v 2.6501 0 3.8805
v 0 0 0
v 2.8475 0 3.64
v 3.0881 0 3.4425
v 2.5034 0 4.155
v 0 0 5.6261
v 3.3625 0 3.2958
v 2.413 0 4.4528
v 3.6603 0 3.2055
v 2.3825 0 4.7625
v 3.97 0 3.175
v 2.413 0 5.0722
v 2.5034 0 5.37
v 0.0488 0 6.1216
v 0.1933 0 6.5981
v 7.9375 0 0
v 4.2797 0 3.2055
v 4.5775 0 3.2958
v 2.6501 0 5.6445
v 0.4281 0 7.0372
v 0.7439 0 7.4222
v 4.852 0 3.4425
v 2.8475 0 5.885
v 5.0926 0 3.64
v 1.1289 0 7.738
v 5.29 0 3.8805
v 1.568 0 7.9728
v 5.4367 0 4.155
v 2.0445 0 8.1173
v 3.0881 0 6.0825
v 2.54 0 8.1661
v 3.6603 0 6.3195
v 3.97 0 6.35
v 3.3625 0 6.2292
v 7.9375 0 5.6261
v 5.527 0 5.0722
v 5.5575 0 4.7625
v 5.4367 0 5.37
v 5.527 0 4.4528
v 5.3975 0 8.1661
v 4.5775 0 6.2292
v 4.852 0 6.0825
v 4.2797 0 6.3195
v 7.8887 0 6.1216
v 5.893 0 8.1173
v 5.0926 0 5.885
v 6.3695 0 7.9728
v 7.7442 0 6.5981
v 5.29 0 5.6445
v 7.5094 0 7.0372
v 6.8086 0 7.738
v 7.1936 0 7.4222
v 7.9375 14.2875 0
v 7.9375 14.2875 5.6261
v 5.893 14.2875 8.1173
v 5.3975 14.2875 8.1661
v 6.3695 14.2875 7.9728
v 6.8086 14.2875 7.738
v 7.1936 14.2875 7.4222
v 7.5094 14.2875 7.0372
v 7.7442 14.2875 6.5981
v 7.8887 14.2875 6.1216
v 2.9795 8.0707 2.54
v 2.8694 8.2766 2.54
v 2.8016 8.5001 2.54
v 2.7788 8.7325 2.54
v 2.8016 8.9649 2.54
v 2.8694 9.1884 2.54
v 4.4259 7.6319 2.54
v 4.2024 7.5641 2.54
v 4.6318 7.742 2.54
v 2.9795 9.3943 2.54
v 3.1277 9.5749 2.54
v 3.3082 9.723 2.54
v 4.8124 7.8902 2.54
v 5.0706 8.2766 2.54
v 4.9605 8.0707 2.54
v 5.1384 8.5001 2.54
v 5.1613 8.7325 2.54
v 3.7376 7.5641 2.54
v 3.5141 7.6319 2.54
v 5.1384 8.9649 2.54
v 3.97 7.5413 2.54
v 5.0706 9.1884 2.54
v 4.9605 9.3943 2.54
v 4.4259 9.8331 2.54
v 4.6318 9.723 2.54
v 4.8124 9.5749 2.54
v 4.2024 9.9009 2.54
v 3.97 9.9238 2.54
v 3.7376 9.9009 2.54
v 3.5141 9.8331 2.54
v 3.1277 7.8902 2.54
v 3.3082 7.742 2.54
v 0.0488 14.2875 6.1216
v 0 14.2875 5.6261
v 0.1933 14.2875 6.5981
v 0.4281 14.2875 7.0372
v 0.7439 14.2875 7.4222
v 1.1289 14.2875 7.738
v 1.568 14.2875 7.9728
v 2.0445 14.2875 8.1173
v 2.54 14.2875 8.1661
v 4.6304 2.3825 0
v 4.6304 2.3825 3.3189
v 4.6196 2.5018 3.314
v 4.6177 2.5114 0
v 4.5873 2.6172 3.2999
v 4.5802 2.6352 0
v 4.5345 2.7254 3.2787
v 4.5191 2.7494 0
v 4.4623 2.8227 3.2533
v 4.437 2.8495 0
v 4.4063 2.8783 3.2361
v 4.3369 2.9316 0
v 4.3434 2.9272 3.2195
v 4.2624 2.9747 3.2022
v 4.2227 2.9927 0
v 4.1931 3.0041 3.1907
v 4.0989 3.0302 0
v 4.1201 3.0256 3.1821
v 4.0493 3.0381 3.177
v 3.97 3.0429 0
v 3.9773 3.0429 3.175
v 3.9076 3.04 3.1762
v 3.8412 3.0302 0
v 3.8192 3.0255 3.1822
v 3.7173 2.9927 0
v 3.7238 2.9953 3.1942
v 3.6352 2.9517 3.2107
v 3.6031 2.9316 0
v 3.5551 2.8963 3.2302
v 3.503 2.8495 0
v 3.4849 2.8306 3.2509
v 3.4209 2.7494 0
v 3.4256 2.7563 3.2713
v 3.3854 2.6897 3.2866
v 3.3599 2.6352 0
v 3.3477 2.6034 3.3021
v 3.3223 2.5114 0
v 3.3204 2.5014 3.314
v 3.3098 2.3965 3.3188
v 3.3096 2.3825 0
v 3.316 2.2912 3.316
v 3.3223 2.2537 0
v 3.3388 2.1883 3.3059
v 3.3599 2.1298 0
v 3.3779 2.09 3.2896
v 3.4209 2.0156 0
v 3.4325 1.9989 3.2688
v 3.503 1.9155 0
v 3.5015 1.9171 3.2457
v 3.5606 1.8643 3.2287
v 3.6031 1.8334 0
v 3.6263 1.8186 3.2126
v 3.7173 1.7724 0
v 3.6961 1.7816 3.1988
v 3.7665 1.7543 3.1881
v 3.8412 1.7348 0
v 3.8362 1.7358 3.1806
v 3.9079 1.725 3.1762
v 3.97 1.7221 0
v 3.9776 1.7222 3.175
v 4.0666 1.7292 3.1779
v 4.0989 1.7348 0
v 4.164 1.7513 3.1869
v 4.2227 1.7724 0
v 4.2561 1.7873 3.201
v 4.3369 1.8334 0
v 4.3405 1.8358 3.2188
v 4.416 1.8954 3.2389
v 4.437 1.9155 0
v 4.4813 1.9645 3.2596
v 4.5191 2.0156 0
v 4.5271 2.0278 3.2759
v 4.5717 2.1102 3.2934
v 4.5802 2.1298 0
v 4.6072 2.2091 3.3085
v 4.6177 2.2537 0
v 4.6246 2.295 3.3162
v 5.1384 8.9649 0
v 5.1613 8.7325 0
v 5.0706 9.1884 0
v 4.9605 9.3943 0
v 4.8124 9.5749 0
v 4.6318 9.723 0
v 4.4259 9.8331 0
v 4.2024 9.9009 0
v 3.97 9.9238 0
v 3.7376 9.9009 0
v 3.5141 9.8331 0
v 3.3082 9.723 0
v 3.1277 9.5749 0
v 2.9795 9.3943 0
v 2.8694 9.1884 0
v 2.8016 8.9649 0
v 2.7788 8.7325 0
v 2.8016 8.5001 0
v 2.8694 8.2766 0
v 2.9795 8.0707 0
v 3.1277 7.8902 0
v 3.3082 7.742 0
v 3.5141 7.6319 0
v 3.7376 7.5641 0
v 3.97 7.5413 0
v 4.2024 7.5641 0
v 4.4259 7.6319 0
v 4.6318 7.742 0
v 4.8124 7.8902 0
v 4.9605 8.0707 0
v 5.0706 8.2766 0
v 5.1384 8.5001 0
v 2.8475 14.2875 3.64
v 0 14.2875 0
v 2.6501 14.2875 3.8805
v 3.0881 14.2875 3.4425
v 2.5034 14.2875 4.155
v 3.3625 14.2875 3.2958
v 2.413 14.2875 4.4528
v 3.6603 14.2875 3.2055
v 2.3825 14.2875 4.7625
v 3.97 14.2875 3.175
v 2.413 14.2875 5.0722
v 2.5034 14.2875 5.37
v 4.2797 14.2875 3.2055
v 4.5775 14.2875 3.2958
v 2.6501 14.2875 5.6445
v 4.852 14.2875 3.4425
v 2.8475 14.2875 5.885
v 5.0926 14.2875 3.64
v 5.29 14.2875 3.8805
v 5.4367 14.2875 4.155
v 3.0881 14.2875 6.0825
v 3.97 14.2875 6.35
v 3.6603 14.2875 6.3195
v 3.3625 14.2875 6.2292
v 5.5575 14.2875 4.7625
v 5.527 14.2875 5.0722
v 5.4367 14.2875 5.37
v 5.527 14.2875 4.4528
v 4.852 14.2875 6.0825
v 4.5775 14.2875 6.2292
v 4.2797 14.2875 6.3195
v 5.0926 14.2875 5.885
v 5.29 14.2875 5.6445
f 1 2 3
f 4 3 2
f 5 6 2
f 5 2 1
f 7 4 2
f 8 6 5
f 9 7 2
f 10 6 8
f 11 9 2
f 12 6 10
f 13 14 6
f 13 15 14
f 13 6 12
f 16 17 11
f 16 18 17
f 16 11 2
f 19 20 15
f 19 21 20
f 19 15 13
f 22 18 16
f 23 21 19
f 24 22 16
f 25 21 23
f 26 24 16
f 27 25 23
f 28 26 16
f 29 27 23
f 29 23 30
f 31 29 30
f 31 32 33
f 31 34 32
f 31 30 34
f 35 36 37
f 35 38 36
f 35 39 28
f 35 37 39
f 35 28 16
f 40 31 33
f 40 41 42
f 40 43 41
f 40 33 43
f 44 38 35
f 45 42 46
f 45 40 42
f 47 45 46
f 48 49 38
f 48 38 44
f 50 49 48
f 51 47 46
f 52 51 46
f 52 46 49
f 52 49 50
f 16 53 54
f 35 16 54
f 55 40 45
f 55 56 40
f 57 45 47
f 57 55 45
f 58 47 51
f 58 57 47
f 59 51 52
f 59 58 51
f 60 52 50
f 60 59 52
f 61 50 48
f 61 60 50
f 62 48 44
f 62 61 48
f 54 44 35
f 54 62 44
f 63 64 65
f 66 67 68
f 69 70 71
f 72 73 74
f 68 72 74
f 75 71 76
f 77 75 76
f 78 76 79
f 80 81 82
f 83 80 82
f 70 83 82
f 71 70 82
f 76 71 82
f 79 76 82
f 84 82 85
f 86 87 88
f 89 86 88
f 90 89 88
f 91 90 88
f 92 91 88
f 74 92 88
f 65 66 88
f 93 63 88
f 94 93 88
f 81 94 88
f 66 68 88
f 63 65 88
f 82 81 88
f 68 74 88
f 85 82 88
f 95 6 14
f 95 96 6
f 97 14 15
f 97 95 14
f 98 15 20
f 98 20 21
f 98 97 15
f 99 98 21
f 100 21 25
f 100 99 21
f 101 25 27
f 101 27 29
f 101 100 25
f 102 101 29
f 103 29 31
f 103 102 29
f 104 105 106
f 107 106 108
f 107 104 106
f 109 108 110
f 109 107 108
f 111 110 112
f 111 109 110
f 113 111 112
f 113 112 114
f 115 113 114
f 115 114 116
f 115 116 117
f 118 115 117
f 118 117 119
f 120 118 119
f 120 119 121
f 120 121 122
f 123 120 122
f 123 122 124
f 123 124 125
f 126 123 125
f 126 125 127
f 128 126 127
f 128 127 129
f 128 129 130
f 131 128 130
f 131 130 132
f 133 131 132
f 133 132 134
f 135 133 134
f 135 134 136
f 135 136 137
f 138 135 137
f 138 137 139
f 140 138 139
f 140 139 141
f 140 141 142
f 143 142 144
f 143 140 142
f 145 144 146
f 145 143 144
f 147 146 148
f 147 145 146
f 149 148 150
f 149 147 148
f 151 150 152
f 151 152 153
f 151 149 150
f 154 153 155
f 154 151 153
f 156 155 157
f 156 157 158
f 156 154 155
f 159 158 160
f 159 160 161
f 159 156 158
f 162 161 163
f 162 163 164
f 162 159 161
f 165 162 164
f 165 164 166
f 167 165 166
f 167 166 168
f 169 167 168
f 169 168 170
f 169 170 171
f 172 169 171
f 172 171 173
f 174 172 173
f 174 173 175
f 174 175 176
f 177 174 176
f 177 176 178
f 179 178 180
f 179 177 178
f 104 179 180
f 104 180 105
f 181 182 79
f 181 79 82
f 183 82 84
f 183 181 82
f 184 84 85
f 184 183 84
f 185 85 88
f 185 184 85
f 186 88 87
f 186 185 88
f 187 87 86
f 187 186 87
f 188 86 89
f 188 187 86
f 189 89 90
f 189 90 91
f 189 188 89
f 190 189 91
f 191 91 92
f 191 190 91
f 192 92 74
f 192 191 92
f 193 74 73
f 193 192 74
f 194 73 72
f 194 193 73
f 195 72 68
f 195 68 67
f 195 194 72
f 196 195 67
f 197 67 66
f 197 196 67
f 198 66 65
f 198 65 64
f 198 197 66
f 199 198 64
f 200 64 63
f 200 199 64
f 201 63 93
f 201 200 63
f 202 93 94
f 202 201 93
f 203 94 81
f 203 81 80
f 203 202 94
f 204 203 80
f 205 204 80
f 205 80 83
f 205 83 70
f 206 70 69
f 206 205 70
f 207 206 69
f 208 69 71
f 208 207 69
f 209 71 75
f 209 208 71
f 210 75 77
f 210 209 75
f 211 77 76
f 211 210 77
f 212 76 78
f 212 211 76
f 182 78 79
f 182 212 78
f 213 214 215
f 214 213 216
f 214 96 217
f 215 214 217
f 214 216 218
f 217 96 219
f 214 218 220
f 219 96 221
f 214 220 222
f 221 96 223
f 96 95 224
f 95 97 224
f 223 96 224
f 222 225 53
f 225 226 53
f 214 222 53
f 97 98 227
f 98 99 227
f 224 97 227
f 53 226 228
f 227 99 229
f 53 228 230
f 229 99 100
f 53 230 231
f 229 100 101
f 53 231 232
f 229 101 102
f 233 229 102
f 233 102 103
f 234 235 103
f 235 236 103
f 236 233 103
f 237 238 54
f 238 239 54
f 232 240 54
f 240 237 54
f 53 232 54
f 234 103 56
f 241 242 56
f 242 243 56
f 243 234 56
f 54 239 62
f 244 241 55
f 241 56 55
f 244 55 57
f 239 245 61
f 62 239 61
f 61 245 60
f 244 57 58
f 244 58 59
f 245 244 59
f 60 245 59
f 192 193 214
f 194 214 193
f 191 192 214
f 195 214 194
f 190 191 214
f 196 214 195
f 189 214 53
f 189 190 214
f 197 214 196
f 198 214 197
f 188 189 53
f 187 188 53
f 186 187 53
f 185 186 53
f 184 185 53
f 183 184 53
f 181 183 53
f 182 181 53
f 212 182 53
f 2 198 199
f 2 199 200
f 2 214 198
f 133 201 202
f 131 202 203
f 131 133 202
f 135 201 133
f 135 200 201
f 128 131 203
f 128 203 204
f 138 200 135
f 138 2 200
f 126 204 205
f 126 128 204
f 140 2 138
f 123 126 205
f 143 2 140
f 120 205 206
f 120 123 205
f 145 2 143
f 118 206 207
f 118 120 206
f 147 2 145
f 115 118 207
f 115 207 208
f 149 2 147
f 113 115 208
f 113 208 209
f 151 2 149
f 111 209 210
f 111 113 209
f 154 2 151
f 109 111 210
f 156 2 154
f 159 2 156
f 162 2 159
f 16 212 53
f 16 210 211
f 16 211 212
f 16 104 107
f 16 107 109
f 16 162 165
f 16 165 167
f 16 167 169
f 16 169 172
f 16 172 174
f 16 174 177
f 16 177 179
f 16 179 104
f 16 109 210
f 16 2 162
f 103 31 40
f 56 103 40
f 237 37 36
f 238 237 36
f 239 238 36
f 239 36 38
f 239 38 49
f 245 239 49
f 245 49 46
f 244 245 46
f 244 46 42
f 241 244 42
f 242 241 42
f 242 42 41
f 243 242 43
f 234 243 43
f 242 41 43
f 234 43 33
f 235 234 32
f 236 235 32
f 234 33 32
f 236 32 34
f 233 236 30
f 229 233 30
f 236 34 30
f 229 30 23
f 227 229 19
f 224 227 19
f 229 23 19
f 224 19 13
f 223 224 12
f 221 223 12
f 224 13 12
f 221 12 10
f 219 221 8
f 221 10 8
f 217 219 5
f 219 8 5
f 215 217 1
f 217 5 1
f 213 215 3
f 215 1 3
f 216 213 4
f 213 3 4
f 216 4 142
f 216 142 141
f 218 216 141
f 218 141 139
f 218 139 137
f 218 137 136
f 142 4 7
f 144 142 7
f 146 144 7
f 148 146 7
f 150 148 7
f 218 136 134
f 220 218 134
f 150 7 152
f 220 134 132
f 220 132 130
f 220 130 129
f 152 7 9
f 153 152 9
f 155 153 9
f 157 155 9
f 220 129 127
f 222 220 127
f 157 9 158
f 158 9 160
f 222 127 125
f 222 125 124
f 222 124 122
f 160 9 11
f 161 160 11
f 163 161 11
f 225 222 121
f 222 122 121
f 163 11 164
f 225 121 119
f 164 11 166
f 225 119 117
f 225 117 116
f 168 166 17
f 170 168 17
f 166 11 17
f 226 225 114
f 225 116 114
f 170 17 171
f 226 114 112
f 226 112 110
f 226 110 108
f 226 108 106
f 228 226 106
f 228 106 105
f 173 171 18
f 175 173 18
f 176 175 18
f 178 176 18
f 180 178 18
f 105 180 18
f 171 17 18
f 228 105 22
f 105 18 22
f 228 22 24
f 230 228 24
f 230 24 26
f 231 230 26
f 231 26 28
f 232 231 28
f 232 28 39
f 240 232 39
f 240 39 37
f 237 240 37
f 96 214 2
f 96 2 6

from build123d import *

# Parameters (mm, degrees)
F0_W     = 7.9375
F0_H     = 8.1661
F0_R     = 1.5875
F1_DEPTH = 14.2875
F2_R     = 2.54
F3_R     = 1.19126
F4_DEPTH = 2.54
F3_R_2   = 0.6604
F5_DEPTH = 3.81


with BuildPart() as f1:
    # F0 (on Front) → F1 (new body)
    with BuildSketch(Plane.XZ):
        with Locations((3.96875, 4.08305)):
            Rectangle(F0_W, F0_H)
        with Locations((3.97002, 4.7625)):
            Circle(F0_R, mode=Mode.SUBTRACT)
    extrude(amount=-F1_DEPTH)

    # F2
    f2_edges = [f1.edges().sort_by_distance(p)[0] for p in [
        (0, 7.14375, 8.1661),
        (7.9375, 7.14375, 8.1661),
    ]]
    fillet(f2_edges, radius=F2_R)

    # F3 (on Top) → F4 (cut)
    with BuildSketch(Plane.XY):
        with Locations((3.97002, 8.73252)):
            Circle(F3_R)
    extrude(amount=F4_DEPTH, mode=Mode.SUBTRACT)

    # F3 (on Top) → F5 (cut)
    with BuildSketch(Plane.XY):
        with Locations((3.97002, 2.38252)):
            Circle(F3_R_2)
    extrude(amount=F5_DEPTH, mode=Mode.SUBTRACT)


solid = f1.part
